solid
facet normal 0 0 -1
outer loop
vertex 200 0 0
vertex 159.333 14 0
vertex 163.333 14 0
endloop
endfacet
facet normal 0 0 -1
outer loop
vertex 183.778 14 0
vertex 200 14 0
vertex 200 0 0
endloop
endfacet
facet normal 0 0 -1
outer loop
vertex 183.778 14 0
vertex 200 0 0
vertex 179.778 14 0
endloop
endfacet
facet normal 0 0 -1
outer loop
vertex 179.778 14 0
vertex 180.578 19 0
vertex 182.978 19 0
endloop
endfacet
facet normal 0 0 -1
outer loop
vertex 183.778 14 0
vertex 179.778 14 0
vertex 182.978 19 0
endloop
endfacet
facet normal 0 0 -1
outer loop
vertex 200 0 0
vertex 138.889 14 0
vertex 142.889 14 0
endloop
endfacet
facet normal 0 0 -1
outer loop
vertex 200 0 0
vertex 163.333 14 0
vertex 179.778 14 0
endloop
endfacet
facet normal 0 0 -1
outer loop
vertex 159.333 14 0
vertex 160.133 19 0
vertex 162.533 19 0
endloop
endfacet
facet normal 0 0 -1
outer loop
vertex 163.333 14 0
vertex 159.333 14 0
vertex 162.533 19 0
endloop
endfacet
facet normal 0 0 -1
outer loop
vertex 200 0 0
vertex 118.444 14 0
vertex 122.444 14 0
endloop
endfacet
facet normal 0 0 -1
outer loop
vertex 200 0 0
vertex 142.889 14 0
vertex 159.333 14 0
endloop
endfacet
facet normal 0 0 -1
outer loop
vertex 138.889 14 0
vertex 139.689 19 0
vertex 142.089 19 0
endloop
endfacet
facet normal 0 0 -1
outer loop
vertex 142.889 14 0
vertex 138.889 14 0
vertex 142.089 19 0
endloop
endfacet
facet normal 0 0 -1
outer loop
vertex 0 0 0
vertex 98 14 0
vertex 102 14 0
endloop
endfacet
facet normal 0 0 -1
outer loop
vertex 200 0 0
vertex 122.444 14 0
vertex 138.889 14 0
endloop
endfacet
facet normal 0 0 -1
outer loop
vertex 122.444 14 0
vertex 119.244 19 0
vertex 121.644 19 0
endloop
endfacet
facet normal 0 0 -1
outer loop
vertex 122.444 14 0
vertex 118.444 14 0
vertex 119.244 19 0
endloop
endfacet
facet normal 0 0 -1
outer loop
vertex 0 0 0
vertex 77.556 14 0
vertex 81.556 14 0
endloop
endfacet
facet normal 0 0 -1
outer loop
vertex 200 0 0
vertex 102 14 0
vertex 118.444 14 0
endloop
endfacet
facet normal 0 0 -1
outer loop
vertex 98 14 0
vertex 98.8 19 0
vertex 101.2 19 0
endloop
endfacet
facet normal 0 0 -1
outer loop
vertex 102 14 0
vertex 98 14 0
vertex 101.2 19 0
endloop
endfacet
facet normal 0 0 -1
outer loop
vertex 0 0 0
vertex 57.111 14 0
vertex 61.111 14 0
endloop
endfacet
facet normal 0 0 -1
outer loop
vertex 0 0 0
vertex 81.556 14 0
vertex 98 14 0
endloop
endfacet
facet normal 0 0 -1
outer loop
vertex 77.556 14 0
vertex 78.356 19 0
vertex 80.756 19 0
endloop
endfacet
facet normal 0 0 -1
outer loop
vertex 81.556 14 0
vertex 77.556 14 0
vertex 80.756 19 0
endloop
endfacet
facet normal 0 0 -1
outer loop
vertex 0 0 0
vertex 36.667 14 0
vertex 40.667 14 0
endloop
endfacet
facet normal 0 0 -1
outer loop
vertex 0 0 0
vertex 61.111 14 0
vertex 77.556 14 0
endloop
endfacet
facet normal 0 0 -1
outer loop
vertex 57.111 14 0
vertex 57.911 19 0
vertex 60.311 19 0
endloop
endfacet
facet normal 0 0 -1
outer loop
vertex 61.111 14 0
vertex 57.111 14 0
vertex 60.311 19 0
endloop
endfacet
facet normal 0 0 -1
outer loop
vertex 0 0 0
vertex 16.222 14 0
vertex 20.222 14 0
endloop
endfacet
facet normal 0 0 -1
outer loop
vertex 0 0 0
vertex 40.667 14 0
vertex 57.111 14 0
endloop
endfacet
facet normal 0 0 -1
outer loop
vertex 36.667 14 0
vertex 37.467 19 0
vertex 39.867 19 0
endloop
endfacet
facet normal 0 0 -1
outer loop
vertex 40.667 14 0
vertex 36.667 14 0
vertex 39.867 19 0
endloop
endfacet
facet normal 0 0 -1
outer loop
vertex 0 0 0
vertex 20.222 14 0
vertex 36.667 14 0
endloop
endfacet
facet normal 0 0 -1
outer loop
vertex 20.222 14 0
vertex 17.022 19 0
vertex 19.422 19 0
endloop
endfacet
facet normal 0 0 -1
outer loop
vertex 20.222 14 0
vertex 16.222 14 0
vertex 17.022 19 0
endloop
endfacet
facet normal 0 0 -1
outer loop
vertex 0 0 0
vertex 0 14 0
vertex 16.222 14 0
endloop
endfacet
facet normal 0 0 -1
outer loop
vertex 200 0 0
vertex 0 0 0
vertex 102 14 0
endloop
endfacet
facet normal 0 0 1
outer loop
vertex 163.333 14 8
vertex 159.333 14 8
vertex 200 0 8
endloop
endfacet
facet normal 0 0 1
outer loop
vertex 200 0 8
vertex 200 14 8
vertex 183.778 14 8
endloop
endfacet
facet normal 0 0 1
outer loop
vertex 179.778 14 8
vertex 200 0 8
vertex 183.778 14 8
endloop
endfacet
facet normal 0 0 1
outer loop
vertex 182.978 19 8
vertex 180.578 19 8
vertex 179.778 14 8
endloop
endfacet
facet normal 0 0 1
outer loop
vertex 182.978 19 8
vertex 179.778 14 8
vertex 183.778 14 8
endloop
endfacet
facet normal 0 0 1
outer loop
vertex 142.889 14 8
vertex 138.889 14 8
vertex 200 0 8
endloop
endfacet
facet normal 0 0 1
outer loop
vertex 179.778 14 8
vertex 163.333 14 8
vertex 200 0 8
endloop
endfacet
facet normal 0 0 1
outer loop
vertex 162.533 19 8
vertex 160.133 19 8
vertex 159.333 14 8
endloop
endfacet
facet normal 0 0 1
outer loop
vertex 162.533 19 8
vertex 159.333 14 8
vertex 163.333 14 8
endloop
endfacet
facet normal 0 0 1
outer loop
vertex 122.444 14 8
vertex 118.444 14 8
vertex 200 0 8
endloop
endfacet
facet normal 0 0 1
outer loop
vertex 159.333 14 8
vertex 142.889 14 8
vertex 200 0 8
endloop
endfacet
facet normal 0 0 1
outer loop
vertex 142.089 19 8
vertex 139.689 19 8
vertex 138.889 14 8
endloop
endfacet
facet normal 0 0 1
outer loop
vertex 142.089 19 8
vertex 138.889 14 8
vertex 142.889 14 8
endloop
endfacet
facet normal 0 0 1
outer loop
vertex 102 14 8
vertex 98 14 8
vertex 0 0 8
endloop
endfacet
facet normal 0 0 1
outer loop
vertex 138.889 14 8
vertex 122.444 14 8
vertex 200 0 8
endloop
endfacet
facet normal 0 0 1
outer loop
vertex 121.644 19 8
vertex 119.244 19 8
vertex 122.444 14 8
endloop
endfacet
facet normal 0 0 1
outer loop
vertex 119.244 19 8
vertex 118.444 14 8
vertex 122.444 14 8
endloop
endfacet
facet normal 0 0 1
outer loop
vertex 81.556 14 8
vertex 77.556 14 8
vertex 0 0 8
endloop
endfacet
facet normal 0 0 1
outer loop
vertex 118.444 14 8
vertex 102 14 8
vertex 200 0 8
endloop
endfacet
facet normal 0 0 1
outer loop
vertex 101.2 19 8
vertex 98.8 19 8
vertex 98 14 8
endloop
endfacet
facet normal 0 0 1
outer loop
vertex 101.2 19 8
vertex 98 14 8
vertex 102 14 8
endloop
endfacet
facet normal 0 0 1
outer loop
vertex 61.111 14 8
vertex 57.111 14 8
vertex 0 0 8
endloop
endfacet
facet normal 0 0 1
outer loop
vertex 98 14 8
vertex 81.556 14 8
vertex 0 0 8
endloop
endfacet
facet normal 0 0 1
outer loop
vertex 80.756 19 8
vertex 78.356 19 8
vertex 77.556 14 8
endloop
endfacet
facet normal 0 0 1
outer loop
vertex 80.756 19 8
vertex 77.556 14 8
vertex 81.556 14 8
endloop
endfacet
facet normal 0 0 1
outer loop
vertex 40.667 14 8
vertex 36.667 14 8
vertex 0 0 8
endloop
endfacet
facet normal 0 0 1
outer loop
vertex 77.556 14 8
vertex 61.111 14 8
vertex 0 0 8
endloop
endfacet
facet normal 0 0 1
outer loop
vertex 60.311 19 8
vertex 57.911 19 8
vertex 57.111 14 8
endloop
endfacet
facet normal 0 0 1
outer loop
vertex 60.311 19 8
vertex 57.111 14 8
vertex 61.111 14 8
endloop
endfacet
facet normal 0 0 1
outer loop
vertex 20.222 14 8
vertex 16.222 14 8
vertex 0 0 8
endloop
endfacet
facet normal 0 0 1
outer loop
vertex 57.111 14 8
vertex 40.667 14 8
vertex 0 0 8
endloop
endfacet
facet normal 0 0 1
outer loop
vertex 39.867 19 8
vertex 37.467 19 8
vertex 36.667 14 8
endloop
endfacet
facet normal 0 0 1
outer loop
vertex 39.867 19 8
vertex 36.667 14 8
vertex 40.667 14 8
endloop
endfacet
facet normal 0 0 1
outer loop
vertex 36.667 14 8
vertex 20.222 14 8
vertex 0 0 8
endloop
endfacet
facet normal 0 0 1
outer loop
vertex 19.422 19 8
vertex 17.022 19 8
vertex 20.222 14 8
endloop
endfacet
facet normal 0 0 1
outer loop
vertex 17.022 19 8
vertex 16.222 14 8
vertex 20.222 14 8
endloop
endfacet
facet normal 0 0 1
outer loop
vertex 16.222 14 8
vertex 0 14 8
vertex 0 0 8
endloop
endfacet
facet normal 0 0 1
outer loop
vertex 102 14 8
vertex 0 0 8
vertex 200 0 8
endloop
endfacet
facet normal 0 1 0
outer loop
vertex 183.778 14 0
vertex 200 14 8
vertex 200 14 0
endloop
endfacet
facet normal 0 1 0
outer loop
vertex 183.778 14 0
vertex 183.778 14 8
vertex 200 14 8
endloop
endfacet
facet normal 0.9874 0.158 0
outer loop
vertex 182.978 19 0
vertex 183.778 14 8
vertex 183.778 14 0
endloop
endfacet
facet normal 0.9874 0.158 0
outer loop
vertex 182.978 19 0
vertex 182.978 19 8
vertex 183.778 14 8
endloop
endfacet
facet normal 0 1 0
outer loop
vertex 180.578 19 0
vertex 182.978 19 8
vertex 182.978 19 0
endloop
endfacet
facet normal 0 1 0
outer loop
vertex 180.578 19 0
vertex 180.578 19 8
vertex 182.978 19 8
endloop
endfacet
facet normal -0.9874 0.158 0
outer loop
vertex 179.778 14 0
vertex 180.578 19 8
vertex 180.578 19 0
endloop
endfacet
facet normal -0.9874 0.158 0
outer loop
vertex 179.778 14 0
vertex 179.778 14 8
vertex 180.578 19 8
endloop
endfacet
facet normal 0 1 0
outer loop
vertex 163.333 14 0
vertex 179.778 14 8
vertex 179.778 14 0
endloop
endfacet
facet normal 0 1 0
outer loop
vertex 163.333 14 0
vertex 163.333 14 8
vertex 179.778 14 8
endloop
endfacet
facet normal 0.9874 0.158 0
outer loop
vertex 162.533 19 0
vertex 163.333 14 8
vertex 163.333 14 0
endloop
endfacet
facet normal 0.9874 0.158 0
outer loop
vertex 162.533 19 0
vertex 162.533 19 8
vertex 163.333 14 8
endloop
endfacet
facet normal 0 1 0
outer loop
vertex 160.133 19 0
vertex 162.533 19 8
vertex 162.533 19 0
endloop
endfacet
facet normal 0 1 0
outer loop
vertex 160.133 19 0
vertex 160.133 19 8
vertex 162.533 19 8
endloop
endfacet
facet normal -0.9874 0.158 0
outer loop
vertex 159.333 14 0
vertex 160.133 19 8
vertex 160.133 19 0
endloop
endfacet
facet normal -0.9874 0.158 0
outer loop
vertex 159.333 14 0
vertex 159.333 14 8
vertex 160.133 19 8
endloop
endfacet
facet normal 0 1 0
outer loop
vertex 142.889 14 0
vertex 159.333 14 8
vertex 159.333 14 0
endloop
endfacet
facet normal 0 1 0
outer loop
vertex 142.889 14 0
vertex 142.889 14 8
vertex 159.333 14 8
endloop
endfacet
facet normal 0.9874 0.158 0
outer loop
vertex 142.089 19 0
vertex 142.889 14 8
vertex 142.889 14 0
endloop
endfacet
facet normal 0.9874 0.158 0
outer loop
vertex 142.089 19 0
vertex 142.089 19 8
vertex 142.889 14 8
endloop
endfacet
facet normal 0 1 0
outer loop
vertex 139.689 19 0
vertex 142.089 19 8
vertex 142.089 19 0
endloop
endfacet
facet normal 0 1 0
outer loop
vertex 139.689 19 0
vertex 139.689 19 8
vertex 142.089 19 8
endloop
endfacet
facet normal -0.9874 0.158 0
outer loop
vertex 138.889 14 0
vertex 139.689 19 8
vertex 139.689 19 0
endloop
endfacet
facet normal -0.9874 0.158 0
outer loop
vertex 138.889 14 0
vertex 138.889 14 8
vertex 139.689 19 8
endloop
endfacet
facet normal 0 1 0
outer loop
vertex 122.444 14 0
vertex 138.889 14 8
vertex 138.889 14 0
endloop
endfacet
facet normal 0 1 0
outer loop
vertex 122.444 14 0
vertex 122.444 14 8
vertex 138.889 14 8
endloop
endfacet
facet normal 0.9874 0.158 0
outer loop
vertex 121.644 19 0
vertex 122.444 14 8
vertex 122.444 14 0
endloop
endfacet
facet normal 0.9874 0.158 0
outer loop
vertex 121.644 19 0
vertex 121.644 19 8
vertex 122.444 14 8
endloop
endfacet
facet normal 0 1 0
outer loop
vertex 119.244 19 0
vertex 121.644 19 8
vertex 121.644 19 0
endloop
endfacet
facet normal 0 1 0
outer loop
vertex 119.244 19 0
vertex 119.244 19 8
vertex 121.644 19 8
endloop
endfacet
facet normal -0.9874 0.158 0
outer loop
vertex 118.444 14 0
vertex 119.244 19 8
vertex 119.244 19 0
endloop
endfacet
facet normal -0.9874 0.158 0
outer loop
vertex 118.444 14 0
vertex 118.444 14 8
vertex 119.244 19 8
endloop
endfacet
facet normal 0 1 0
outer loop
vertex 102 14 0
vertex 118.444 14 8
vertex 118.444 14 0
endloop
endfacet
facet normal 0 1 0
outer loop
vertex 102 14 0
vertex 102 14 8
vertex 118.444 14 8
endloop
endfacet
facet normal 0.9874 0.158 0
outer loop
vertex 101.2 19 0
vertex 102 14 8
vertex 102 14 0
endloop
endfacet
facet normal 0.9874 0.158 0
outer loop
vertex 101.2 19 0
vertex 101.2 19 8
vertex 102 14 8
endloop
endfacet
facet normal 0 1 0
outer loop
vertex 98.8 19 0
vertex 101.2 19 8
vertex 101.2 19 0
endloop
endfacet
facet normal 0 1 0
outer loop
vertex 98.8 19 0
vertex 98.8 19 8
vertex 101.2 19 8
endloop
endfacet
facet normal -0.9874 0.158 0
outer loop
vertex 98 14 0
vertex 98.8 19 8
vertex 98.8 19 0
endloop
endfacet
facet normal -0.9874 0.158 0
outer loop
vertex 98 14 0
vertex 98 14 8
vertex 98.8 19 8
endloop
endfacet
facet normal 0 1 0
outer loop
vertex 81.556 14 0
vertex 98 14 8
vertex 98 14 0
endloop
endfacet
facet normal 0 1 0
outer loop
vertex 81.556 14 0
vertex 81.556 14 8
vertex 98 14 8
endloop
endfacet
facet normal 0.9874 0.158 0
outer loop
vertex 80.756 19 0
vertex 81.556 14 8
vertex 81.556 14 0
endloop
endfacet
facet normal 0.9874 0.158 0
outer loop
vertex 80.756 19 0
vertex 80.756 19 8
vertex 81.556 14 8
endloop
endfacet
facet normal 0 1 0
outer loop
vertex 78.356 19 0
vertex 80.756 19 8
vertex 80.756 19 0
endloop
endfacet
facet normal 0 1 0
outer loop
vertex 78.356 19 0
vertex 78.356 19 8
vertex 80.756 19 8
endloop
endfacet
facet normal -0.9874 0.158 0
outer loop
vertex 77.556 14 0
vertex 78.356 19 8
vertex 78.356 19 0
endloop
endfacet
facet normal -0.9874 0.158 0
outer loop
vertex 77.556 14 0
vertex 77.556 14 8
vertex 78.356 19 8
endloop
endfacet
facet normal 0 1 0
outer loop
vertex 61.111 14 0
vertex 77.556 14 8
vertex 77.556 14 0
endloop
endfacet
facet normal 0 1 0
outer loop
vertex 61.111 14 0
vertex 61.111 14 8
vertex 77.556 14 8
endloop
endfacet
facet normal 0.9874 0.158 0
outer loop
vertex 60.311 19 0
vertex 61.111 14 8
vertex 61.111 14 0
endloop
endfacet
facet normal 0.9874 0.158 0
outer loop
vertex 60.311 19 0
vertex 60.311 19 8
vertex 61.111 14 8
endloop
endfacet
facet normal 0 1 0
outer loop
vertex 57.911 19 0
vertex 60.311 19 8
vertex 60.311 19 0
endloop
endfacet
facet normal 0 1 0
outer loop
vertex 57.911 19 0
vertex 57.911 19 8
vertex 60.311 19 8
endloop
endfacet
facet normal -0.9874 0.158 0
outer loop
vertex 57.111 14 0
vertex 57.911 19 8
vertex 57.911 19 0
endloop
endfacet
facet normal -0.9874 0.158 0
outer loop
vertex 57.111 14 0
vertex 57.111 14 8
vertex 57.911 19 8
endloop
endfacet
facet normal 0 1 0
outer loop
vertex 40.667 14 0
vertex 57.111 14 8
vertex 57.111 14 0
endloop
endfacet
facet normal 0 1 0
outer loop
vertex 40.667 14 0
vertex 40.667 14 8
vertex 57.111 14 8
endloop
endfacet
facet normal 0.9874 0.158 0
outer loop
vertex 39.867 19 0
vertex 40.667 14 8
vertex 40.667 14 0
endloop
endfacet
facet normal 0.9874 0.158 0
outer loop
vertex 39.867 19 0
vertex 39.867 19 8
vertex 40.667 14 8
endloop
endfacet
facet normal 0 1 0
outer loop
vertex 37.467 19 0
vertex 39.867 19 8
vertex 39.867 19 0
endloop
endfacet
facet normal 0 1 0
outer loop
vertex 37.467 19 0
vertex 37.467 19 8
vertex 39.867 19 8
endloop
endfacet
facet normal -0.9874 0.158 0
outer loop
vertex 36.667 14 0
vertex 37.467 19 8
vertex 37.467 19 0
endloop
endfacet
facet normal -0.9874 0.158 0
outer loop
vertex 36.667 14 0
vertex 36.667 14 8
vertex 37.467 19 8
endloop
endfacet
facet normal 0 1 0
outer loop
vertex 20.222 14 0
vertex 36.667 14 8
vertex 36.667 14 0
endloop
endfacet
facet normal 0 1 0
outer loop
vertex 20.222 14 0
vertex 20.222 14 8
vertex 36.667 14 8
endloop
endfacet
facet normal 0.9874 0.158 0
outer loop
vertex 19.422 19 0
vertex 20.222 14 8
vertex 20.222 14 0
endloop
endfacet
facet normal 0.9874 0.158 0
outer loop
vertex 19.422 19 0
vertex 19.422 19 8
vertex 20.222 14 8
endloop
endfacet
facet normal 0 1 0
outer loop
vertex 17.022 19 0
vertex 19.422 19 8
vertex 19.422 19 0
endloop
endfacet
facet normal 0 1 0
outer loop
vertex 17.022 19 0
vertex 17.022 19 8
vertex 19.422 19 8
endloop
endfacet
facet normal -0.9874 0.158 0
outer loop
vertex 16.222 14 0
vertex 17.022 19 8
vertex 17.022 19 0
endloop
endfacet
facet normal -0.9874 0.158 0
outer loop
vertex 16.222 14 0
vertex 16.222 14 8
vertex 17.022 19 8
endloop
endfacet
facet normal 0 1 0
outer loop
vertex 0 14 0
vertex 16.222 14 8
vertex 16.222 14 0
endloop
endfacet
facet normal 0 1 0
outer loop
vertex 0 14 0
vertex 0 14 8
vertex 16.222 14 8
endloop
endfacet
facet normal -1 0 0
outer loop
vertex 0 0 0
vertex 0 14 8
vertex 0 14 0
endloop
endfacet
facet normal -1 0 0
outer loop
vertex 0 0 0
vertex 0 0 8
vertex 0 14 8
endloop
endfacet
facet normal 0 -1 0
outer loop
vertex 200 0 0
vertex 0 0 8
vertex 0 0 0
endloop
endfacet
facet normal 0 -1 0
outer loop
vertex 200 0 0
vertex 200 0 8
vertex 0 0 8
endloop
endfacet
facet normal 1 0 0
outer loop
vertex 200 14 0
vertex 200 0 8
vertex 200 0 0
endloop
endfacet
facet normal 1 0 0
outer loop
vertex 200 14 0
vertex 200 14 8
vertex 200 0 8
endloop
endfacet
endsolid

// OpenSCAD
$fn = 32;

// ----------------------------------------------------------------------
// Gear rack: 9 teeth on a 200 mm bar, pitch 20.44 mm
// ----------------------------------------------------------------------

// --- parameters (mm) ---
profile_height = 8;       // extrusion height
profile_points = 40;      // points of the closed outline

profile = [[0, 0], [200, 0], [200, 14], [183.778, 14], [182.978, 19], [180.578, 19], [179.778, 14], [163.333, 14], [162.533, 19], [160.133, 19], [159.333, 14], [142.889, 14], [142.089, 19], [139.689, 19], [138.889, 14], [122.444, 14], [121.644, 19], [119.244, 19], [118.444, 14], [102, 14], [101.2, 19], [98.8, 19], [98, 14], [81.556, 14], [80.756, 19], [78.356, 19], [77.556, 14], [61.111, 14], [60.311, 19], [57.911, 19], [57.111, 14], [40.667, 14], [39.867, 19], [37.467, 19], [36.667, 14], [20.222, 14], [19.422, 19], [17.022, 19], [16.222, 14], [0, 14]];  // single closed polygon, 40 points, counter clockwise

// --- the one profile operation ---
linear_extrude(height = profile_height) polygon(points = profile);
